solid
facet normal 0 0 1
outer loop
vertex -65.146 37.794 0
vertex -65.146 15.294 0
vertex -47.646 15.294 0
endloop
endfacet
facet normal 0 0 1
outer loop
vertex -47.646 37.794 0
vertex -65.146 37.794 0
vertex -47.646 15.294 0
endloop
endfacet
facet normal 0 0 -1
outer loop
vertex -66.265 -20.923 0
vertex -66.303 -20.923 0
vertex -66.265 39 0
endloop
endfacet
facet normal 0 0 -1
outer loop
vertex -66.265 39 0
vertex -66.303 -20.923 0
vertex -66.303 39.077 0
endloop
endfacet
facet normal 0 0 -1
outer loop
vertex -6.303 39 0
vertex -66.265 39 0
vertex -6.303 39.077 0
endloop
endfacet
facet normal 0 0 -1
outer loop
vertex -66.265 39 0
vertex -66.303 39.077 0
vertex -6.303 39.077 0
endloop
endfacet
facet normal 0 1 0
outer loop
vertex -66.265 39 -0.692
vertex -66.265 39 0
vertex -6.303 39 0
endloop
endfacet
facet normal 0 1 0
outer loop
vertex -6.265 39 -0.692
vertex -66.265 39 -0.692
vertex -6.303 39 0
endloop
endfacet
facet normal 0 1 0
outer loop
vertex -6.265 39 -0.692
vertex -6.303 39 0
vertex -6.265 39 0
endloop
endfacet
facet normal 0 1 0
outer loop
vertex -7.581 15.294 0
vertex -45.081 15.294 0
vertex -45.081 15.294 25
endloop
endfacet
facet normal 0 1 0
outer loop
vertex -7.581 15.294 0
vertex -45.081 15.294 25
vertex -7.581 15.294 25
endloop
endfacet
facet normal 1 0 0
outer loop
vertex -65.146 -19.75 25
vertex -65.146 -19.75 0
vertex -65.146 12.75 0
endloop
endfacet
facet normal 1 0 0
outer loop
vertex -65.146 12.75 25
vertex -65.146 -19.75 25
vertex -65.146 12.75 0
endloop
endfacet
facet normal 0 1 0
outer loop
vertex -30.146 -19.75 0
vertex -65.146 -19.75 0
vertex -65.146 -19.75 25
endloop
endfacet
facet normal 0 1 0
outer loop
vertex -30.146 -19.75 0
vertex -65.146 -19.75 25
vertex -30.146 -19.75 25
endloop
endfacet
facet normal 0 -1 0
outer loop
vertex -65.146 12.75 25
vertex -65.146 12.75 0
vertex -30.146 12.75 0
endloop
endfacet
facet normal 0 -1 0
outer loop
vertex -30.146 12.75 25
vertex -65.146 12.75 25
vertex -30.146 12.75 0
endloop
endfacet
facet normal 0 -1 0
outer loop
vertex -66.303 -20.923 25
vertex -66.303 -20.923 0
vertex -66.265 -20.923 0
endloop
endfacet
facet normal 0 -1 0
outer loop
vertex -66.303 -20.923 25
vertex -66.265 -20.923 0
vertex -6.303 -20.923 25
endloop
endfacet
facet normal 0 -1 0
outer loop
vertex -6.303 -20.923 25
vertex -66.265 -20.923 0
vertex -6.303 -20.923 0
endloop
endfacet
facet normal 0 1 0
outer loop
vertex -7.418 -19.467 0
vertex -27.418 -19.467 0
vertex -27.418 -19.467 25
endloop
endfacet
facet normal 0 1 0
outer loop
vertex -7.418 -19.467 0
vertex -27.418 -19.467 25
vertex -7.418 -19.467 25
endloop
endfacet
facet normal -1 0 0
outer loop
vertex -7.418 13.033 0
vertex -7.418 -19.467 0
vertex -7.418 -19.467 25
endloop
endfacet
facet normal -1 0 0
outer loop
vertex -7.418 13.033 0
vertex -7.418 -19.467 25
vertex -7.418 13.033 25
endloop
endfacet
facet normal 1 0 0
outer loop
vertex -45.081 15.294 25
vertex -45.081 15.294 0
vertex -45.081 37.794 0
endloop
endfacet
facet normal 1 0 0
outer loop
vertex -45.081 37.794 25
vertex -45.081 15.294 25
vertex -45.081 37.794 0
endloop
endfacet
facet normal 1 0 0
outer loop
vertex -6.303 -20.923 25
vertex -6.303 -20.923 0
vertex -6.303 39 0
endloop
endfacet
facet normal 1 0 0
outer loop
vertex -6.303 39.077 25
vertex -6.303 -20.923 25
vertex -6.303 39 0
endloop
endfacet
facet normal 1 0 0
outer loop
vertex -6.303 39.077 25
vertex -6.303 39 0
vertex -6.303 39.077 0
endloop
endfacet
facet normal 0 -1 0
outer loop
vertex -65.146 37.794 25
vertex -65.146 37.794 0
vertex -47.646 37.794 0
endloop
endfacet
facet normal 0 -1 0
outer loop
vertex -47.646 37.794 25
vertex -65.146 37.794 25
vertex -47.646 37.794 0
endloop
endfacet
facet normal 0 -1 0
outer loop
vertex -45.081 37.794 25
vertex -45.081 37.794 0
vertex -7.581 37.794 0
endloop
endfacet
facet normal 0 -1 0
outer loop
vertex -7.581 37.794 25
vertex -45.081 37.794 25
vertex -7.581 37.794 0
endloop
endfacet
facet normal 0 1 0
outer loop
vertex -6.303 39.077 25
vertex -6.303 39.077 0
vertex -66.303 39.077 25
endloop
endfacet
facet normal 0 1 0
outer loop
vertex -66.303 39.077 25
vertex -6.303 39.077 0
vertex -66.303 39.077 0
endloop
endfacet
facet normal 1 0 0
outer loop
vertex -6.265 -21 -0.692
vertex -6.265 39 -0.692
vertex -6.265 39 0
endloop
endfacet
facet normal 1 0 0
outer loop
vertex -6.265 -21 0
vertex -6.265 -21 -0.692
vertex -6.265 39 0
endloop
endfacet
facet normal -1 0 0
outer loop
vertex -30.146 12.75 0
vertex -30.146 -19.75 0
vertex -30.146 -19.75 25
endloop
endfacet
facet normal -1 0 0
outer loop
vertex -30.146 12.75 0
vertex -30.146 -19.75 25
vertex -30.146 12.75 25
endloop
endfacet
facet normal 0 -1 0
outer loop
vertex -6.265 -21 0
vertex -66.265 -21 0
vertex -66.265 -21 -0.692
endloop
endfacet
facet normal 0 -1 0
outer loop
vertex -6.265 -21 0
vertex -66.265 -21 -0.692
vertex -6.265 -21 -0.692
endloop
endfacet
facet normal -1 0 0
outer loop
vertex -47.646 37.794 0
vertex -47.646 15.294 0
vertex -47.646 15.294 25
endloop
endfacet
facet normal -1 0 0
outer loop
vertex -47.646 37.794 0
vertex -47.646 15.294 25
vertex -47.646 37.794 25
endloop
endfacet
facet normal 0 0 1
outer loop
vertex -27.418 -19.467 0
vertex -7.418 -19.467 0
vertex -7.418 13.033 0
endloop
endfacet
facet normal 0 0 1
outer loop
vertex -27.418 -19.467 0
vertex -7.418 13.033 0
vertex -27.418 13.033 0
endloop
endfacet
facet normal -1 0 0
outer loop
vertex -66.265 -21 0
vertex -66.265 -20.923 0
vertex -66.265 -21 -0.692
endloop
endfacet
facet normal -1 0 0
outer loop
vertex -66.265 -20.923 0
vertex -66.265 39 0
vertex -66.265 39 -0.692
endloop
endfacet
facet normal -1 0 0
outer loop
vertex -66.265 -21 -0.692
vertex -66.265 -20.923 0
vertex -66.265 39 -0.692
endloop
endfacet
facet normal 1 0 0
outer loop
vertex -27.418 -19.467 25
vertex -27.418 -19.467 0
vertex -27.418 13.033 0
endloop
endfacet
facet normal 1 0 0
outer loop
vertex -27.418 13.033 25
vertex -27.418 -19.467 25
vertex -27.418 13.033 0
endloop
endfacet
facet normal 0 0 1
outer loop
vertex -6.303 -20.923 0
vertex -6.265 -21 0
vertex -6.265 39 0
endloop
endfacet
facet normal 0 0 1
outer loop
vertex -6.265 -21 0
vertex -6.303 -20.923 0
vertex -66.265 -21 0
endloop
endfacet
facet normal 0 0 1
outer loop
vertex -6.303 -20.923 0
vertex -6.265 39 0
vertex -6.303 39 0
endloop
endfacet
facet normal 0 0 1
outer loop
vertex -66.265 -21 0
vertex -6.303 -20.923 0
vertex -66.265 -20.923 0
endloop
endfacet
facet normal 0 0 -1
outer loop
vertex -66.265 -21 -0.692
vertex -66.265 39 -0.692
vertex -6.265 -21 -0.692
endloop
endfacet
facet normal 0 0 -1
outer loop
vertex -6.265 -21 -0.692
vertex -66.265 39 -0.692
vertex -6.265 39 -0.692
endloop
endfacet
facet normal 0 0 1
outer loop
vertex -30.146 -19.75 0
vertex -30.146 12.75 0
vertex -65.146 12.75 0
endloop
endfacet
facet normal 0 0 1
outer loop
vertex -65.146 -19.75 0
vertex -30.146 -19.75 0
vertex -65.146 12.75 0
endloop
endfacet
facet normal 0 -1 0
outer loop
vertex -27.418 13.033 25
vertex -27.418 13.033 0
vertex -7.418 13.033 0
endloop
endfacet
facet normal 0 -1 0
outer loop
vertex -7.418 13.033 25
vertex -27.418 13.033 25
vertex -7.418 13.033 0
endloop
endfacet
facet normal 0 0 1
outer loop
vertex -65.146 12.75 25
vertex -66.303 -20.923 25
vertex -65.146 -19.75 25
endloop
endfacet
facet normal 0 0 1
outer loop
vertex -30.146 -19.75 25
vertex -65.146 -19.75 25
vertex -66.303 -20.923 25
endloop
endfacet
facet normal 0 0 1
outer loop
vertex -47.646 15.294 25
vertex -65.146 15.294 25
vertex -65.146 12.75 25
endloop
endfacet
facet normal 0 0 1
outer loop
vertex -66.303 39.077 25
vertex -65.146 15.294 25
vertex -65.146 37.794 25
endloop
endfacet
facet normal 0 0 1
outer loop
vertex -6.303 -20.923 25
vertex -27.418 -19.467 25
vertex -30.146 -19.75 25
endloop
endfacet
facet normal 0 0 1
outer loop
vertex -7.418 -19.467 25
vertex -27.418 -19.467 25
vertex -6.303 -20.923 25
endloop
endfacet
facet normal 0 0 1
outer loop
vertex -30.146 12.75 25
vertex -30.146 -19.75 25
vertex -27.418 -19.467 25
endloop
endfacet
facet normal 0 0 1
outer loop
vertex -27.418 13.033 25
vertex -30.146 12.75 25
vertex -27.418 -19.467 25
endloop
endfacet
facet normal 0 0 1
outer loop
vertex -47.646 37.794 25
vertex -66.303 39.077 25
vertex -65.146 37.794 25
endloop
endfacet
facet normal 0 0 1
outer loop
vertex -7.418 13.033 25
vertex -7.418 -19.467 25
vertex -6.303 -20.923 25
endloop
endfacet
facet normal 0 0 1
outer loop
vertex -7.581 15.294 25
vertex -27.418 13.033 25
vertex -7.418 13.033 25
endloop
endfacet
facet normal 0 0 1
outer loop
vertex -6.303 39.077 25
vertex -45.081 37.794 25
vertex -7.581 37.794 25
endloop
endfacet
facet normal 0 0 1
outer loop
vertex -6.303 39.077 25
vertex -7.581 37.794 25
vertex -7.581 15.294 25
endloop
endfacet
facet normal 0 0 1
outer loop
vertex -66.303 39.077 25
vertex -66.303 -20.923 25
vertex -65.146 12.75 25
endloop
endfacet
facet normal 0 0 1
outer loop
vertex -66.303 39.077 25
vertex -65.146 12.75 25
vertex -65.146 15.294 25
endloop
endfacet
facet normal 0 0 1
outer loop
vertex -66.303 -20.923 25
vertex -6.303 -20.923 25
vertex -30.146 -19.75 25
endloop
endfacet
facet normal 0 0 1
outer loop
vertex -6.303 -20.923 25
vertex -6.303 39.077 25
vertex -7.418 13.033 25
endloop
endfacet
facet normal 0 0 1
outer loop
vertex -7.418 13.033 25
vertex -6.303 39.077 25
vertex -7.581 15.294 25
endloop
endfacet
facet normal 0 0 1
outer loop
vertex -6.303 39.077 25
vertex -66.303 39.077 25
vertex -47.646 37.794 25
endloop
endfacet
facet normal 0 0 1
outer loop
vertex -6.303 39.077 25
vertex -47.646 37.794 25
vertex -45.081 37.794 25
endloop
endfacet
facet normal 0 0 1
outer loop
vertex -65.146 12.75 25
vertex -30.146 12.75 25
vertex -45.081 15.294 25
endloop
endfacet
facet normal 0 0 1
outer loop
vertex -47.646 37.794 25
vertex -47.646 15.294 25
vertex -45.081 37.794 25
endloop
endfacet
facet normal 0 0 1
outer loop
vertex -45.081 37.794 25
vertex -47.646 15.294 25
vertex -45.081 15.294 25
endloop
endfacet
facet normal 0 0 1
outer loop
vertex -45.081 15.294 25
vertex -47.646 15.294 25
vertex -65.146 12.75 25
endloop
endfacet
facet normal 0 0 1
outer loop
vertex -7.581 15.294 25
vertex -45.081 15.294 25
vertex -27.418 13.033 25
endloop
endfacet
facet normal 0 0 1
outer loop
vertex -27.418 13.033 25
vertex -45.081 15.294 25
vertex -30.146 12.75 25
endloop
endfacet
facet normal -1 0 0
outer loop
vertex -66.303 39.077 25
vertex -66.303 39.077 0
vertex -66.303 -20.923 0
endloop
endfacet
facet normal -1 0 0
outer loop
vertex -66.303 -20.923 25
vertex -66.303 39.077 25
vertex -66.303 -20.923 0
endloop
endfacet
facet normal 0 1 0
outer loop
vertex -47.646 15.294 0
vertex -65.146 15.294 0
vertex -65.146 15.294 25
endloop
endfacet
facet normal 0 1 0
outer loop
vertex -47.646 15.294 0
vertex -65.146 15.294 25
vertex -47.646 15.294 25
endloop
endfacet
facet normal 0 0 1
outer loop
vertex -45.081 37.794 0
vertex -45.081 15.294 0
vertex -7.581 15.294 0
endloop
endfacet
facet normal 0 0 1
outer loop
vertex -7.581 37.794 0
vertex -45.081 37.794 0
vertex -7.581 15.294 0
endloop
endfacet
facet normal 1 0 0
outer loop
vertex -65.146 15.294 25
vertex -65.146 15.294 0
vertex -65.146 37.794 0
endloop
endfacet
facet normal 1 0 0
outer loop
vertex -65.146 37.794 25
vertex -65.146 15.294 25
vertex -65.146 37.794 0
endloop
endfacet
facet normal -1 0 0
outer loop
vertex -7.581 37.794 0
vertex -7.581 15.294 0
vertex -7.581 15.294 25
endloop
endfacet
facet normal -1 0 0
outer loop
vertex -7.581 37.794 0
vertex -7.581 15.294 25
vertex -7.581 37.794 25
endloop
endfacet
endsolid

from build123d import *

# Parameters (mm, degrees)
F0_W     = 20
F0_H     = 25
F0_W_2   = 17.5
F0_H_2   = 22.5
F0_W_3   = 37.5
F0_W_4   = 35
F0_H_3   = 32.5
F0_W_5   = 22.5
F0_H_4   = 35
F1_DEPTH = 25
F2_W     = 60
F2_H     = 0.691662
F3_DEPTH = 39
F4_DEPTH = 21


with BuildPart() as f1:
    # F0 (on Top) → F1 (new body)
    with BuildSketch(Plane.XY):
        with Locations((-56.303288, 26.577459)):
            Rectangle(F0_W, F0_H)
        with Locations((-56.396089, 26.54361)):
            Rectangle(F0_W_2, F0_H_2, mode=Mode.SUBTRACT)
        Polygon((-6.303288, 39.077459), (-46.303288, 39.077459), (-46.303288, 14.077459), (-28.803288, 14.077459), (-6.303288, 14.077459), align=None)
        with Locations((-26.331019, 26.54361)):
            Rectangle(F0_W_3, F0_H_2, mode=Mode.SUBTRACT)
        Polygon((-28.803288, 14.077459), (-46.303288, 14.077459), (-66.303288, 14.077459), (-66.303288, -20.922541), (-28.803288, -20.922541), align=None)
        with Locations((-47.646089, -3.499608)):
            Rectangle(F0_W_4, F0_H_3, mode=Mode.SUBTRACT)
        with Locations((-17.553288, -3.422541)):
            Rectangle(F0_W_5, F0_H_4)
        with Locations((-17.418107, -3.217003)):
            Rectangle(F0_W, F0_H_3, mode=Mode.SUBTRACT)
    extrude(amount=F1_DEPTH)

    # F2 (on Front) → F3 (join)
    with BuildSketch(Plane.XZ):
        with Locations((-36.265093, -0.345831)):
            Rectangle(F2_W, F2_H)
    extrude(amount=-F3_DEPTH)

    # F3_face (on face) → F4 (join)
    with BuildSketch(Plane(origin=(-36.265093, 0, -0.345831), x_dir=(1, 0, 0), z_dir=(0, -1, 0))):
        Polygon((30, -0.345831), (30, 0.345831), (29.961805, 0.345831), (28.846987, 0.345831), (8.846987, 0.345831), (6.119005, 0.345831), (-28.880995, 0.345831), (-30, 0.345831), (-30, -0.345831), align=None)
    extrude(amount=F4_DEPTH)


solid = f1.part
